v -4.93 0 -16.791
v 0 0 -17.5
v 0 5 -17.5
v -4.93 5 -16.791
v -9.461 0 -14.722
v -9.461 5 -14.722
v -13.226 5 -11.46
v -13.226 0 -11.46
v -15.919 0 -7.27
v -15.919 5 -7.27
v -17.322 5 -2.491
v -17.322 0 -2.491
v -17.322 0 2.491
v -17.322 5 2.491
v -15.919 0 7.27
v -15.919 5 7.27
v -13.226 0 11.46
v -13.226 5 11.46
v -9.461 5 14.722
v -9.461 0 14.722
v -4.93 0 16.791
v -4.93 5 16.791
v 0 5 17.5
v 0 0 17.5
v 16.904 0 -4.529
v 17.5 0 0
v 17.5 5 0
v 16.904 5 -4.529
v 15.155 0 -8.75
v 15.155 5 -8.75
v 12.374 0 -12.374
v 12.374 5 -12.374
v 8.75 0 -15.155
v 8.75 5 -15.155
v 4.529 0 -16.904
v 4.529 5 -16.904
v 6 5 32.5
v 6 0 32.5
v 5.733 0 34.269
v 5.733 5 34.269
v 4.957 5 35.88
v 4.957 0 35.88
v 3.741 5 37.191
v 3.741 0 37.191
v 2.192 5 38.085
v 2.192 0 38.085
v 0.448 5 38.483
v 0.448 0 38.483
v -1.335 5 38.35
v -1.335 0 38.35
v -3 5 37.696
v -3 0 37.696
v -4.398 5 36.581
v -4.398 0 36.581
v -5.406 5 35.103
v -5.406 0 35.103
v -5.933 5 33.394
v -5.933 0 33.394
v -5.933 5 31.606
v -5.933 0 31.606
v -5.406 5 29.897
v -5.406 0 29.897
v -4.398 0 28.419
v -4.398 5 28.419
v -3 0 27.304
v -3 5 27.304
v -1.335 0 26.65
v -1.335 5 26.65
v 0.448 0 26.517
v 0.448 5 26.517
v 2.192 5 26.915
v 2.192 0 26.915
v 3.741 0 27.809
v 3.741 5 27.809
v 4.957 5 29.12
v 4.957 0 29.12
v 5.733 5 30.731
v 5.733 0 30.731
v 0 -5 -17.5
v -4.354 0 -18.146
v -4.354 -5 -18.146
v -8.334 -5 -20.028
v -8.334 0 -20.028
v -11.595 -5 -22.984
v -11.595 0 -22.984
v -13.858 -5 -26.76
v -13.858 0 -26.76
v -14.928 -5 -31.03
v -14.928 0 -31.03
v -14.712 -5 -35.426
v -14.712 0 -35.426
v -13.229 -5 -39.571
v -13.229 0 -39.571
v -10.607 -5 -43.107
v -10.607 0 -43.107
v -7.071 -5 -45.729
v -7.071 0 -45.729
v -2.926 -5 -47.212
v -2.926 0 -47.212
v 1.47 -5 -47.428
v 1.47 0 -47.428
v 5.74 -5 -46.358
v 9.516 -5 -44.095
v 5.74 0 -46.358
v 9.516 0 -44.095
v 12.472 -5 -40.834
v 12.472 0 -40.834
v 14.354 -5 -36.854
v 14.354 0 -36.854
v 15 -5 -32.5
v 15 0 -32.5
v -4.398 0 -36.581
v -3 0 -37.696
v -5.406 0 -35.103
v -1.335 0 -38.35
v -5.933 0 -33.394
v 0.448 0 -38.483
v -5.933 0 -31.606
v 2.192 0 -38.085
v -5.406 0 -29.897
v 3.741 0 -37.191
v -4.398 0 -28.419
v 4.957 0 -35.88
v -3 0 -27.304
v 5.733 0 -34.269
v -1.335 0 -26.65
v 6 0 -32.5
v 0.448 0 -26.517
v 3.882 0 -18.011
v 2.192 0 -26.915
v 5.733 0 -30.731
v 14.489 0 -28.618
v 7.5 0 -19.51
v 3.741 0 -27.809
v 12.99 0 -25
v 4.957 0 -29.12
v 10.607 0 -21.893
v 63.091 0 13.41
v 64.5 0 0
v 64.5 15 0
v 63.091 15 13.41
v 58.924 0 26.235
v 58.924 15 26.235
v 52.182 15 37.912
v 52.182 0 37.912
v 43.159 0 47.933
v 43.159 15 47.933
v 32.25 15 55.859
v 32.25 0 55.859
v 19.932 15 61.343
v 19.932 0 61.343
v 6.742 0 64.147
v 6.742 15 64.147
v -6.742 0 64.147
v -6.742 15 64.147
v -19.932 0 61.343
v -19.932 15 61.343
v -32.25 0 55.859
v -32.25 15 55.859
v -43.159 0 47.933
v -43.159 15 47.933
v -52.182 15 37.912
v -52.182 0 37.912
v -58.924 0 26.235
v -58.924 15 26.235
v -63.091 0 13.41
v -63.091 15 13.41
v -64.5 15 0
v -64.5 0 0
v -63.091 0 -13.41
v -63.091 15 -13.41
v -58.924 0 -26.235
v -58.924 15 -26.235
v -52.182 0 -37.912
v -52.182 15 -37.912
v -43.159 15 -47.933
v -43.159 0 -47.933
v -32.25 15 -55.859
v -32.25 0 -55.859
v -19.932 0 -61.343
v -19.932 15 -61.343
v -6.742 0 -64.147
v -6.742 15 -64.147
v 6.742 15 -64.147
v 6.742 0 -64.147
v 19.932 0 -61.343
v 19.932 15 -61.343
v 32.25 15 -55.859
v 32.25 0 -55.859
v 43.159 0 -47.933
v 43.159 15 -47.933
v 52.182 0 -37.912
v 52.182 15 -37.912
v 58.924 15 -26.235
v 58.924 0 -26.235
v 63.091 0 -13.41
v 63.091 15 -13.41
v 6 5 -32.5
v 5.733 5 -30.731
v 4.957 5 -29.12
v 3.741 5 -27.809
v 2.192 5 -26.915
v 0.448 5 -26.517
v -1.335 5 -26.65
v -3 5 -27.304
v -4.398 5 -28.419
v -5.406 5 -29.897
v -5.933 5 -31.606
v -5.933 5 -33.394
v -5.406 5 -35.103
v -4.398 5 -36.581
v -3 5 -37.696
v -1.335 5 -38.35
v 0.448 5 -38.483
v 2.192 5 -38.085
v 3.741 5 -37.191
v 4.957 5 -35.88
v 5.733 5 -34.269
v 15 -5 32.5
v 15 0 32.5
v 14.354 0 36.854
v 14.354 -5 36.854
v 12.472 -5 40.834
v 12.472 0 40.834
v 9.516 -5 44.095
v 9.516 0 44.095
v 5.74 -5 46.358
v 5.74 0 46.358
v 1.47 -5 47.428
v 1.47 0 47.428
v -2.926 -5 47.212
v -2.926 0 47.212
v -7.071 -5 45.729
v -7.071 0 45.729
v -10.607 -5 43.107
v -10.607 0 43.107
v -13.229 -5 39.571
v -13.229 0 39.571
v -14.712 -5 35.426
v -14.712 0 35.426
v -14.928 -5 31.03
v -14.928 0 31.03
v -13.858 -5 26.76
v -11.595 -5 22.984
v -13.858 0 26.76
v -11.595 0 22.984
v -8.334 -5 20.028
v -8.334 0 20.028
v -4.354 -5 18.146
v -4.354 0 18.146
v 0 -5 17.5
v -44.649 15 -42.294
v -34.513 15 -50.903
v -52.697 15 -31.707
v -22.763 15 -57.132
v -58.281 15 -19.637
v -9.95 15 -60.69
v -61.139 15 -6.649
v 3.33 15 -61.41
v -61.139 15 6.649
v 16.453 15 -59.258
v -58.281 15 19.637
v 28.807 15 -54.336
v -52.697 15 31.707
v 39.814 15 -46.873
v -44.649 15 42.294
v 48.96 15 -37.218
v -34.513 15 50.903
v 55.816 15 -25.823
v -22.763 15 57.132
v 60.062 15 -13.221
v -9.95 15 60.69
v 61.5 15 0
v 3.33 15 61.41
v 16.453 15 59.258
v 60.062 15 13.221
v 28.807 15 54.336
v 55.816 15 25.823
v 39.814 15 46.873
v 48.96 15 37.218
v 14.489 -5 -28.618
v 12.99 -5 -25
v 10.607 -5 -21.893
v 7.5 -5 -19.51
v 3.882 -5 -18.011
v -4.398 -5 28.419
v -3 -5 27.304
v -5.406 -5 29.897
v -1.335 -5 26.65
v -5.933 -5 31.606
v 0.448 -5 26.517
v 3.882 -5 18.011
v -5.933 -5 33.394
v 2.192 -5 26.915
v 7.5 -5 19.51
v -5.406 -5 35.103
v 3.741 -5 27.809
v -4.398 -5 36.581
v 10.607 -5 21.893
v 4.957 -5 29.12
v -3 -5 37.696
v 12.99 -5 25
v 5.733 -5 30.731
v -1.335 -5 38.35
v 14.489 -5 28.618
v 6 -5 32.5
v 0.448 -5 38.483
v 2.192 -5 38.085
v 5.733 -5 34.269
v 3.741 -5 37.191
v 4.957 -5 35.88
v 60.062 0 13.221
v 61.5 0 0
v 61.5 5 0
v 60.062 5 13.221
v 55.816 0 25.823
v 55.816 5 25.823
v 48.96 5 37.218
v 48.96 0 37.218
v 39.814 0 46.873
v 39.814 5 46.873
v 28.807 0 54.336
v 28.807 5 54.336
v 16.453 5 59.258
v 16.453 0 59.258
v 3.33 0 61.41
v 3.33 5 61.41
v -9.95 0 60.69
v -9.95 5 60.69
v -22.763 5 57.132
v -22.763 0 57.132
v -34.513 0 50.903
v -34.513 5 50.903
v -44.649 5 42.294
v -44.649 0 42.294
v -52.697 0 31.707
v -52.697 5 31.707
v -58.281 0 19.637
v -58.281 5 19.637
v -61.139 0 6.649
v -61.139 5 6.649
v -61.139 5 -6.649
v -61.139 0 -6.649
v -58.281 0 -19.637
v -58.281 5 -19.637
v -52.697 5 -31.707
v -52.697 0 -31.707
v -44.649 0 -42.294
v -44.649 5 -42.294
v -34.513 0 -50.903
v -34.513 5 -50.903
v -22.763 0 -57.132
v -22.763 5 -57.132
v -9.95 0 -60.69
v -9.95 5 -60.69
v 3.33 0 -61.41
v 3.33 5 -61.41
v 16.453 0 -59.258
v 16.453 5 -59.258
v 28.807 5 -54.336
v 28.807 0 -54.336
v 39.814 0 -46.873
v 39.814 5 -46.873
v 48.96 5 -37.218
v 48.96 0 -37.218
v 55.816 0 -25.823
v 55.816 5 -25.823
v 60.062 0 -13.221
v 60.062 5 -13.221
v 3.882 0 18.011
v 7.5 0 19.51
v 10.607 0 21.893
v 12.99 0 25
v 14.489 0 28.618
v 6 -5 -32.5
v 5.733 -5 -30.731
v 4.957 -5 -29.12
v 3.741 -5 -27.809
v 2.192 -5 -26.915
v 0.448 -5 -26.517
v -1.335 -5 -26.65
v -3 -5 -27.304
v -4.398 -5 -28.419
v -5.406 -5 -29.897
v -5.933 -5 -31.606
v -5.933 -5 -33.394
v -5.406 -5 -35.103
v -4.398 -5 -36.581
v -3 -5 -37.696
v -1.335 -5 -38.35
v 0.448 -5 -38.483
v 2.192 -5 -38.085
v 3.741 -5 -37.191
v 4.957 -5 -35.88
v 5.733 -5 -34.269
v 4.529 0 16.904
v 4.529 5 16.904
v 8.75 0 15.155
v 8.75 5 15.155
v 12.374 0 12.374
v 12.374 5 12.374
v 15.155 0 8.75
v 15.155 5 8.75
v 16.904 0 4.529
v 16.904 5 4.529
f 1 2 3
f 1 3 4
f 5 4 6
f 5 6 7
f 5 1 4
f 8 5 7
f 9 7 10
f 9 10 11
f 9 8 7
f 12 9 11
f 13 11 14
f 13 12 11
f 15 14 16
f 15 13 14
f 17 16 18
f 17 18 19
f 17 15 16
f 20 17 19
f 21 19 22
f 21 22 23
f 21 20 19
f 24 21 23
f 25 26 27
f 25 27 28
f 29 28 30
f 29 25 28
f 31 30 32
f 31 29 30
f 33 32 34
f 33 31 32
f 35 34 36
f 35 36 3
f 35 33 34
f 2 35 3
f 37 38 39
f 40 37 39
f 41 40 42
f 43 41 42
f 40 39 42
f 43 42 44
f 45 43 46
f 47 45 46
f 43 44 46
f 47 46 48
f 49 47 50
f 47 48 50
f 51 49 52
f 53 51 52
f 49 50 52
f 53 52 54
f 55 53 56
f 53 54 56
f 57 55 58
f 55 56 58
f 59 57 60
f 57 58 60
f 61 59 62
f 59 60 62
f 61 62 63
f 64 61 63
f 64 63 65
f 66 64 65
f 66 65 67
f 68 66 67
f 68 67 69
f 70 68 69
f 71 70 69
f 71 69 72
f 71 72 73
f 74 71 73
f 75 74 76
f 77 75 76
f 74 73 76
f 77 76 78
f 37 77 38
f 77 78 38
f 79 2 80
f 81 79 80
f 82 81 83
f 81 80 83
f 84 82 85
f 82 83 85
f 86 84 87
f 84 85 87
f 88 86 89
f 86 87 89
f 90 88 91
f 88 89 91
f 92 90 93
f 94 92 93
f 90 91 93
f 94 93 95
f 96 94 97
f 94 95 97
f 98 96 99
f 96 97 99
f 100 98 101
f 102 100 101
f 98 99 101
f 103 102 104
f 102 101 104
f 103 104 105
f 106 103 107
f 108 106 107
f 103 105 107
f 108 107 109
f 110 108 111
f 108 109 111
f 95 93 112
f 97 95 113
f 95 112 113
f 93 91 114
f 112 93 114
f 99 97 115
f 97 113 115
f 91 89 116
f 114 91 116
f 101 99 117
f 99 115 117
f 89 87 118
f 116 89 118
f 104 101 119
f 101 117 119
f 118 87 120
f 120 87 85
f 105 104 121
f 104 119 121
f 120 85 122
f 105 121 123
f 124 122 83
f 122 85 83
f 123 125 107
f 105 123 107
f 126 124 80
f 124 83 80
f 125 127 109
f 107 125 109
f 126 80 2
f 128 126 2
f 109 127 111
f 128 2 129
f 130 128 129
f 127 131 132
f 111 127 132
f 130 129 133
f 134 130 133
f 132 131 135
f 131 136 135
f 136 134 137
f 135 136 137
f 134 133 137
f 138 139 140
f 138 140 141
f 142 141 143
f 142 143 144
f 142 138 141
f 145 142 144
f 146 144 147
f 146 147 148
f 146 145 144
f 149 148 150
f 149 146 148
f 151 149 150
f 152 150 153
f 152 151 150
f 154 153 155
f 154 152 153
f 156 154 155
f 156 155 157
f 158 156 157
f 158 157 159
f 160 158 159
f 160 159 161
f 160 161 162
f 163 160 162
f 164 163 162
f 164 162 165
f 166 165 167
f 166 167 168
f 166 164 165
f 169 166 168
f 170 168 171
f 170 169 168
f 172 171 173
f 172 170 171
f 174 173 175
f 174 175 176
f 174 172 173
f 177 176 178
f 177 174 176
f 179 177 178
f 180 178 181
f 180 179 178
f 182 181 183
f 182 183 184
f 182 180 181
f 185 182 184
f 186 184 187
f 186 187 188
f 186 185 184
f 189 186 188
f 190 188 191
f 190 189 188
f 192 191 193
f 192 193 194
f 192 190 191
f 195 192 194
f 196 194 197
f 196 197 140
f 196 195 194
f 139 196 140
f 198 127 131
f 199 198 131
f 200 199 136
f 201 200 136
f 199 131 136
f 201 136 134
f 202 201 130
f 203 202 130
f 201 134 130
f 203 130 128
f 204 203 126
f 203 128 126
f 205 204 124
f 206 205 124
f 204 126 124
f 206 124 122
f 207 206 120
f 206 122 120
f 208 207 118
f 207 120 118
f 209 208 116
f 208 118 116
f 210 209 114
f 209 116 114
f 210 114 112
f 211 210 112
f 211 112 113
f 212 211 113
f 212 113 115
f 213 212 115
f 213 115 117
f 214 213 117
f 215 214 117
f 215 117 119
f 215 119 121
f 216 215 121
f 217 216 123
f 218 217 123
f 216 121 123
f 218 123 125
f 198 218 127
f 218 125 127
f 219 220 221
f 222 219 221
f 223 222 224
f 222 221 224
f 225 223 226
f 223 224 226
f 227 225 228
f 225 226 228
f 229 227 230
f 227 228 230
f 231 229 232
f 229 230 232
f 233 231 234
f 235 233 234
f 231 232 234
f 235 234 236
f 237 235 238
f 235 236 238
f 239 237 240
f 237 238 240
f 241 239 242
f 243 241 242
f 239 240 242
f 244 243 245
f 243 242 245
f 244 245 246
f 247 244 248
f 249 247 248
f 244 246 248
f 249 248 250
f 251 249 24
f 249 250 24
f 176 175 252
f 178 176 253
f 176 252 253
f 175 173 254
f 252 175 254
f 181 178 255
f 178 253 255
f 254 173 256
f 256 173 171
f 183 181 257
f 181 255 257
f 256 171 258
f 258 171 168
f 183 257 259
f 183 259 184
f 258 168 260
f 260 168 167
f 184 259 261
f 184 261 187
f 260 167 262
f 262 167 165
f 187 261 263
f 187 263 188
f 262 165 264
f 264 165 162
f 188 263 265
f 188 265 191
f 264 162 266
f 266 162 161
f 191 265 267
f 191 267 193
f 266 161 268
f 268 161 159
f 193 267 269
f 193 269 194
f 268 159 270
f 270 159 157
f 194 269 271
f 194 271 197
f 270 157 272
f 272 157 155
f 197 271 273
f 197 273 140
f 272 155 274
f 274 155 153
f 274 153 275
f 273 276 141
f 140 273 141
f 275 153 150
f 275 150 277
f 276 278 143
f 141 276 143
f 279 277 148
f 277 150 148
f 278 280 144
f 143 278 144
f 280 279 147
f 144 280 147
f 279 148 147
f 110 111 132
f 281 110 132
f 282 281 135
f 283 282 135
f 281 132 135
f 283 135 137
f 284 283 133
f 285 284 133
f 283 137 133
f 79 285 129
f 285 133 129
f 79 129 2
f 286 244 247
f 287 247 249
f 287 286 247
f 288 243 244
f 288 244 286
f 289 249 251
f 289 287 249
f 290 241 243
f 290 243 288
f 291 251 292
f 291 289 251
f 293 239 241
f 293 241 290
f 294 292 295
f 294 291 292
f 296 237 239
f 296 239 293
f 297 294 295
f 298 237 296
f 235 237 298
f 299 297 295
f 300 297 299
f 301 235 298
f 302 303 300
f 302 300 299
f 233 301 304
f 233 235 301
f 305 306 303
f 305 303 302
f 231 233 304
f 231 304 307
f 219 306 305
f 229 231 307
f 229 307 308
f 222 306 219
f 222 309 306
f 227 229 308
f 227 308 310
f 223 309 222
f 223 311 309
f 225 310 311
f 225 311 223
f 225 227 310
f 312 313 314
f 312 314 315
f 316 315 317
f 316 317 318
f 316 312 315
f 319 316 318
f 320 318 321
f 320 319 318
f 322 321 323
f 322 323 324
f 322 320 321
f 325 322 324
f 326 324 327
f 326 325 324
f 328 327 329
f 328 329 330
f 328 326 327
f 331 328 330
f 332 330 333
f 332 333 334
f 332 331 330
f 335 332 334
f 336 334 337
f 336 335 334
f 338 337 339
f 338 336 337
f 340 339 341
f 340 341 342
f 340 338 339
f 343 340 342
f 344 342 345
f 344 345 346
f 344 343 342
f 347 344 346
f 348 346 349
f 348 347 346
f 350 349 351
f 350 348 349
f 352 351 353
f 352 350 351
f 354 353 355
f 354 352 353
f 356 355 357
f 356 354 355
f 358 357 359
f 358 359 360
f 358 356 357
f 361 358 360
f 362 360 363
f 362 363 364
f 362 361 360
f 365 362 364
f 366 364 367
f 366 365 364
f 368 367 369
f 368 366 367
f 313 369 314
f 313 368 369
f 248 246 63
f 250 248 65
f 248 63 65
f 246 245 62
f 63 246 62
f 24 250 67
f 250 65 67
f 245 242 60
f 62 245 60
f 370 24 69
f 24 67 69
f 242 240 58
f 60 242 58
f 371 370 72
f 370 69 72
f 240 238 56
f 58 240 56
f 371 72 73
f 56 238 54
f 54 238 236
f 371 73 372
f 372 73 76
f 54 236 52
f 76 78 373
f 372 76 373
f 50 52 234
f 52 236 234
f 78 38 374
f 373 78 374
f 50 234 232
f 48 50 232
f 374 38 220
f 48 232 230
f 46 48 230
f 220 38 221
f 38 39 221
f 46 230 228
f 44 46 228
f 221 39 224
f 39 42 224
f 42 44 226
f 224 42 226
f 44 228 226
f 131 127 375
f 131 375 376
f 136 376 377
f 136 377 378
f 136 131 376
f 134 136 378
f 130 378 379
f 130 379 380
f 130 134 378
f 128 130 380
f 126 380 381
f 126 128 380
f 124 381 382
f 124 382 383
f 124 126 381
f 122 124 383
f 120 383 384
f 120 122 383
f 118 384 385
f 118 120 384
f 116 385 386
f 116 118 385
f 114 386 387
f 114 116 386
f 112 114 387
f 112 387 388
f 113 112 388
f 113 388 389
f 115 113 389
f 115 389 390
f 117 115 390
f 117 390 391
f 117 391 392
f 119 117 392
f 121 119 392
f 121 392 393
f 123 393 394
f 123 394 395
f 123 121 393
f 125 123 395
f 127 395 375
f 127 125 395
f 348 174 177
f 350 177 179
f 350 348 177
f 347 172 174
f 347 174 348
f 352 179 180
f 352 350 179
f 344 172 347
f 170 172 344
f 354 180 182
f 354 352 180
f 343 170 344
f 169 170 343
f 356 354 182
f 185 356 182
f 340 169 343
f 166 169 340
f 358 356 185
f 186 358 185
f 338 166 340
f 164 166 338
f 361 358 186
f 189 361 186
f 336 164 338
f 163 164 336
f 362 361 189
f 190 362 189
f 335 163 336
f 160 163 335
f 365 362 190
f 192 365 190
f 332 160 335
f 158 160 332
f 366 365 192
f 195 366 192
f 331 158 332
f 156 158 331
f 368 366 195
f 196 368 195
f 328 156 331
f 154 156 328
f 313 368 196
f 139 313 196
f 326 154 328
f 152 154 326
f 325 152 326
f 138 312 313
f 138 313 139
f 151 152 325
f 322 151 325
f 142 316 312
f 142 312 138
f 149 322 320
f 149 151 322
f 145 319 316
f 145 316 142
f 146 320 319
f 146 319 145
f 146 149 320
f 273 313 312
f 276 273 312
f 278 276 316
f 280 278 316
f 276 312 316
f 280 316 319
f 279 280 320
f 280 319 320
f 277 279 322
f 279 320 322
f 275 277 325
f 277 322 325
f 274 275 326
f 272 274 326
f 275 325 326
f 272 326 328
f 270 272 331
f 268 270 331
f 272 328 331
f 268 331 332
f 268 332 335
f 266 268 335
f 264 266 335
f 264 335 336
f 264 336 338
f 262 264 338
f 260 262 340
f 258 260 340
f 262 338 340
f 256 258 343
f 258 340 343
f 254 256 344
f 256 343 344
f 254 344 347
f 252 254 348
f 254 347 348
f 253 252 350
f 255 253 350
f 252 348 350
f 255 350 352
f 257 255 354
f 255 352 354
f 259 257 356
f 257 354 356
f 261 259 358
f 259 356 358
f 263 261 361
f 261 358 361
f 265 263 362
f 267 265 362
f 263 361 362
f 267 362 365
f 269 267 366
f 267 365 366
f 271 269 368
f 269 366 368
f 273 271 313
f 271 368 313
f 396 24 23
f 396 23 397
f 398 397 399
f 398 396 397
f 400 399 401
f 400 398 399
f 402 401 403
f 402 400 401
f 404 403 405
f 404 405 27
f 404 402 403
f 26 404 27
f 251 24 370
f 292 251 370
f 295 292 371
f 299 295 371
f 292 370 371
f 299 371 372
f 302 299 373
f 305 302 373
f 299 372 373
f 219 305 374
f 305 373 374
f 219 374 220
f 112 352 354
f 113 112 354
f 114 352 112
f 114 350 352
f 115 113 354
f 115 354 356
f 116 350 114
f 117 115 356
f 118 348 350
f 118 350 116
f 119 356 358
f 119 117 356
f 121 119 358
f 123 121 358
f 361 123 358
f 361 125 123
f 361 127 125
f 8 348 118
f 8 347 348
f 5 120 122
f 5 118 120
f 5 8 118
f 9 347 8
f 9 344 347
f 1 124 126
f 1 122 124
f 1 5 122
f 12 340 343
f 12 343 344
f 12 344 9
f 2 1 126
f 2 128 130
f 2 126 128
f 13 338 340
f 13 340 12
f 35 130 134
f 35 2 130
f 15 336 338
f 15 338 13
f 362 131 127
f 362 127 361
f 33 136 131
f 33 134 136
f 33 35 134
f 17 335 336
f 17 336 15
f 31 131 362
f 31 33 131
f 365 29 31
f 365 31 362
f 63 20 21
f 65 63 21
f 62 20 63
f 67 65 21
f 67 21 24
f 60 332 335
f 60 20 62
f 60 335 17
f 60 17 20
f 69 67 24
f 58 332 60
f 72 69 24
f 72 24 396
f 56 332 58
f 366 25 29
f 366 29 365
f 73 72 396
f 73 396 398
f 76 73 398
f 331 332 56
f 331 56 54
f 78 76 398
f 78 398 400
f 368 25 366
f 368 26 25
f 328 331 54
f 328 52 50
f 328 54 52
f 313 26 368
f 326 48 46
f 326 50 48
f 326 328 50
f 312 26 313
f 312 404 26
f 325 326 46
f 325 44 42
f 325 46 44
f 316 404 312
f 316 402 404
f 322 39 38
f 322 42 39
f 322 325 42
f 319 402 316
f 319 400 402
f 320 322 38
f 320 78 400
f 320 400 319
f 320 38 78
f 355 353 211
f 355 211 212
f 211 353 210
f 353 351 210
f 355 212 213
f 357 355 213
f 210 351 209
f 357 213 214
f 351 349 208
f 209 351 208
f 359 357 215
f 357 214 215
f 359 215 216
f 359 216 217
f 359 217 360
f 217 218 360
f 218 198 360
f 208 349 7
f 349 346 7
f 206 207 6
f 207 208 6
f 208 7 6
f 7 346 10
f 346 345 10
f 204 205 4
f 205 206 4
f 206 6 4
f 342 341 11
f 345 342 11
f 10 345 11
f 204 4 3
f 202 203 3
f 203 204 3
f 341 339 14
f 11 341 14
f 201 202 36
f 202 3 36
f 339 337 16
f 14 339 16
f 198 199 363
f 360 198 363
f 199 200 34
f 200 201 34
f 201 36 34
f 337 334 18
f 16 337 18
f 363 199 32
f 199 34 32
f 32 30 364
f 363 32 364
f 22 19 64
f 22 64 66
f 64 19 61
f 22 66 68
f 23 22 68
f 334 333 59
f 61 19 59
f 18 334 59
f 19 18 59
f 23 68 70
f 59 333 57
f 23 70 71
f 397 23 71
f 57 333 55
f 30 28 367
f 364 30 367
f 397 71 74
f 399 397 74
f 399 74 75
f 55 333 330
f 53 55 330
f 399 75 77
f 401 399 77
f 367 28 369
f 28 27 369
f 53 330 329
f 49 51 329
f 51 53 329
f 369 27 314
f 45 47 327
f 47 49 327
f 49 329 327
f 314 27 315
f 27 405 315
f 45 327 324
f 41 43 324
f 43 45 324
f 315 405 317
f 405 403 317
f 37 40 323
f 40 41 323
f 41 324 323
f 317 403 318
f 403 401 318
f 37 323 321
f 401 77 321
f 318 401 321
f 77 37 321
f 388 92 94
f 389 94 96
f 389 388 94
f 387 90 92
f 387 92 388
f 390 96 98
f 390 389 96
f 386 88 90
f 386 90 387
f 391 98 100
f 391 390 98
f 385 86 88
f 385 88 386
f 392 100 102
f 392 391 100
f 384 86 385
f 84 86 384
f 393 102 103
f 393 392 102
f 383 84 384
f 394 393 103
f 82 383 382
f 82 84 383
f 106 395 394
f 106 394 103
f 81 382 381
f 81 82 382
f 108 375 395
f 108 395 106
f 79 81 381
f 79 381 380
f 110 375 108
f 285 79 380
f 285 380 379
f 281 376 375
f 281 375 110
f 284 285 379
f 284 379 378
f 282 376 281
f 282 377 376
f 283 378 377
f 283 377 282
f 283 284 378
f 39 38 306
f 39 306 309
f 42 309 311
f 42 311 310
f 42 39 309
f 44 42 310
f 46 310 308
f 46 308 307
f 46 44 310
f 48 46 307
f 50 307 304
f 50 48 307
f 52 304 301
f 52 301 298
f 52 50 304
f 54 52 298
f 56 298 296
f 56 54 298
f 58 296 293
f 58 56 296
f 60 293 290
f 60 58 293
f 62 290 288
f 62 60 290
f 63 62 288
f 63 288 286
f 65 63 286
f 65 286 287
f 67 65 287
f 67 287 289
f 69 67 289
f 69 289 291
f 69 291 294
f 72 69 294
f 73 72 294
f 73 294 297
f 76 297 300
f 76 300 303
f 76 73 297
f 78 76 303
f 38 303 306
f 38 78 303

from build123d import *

# Parameters (mm, degrees)
F0_R     = 61.5
F0_R_2   = 6
F1_DEPTH = 5
F0_R_3   = 64.5
F2_DEPTH = 15
F3_DEPTH = 5


with BuildPart() as f1:
    # F0 (on Front) → F1 (new body)
    with BuildSketch(Plane.XZ):
        Circle(F0_R)
        with BuildLine():
            ThreePointArc((15, -32.5), (-10.606602, -43.106602), (0, -17.5))
            ThreePointArc((0, -17.5), (10.606602, -21.893398), (15, -32.5))
        make_face(mode=Mode.SUBTRACT)
        with BuildLine():
            ThreePointArc((0, 17.5), (12.374369, 12.374369), (17.5, 0))
            ThreePointArc((17.5, 0), (12.374369, -12.374369), (0, -17.5))
            ThreePointArc((0, -17.5), (-17.5, 0), (0, 17.5))
        make_face(mode=Mode.SUBTRACT)
        with BuildLine():
            ThreePointArc((15, 32.5), (10.606602, 21.893398), (0, 17.5))
            ThreePointArc((0, 17.5), (-10.606602, 43.106602), (15, 32.5))
        make_face(mode=Mode.SUBTRACT)
        with BuildLine():
            ThreePointArc((15, 32.5), (-10.606602, 43.106602), (0, 17.5))
            ThreePointArc((0, 17.5), (10.606602, 21.893398), (15, 32.5))
        make_face()
        with Locations((0, 32.5)):
            Circle(F0_R_2, mode=Mode.SUBTRACT)
        with BuildLine():
            ThreePointArc((15, -32.5), (10.606602, -21.893398), (0, -17.5))
            ThreePointArc((0, -17.5), (-10.606602, -43.106602), (15, -32.5))
        make_face()
        with Locations((0, -32.5)):
            Circle(F0_R_2, mode=Mode.SUBTRACT)
    extrude(amount=-F1_DEPTH)


with BuildPart() as f2:
    # F0 (on Front) → F2 (new body)
    with BuildSketch(Plane.XZ):
        Circle(F0_R_3)
        Circle(F0_R, mode=Mode.SUBTRACT)
    extrude(amount=-F2_DEPTH)


with BuildPart() as f3:
    # F0 (on Front) → F3 (new body)
    with BuildSketch(Plane.XZ):
        with BuildLine():
            ThreePointArc((15, 32.5), (-10.606602, 43.106602), (0, 17.5))
            ThreePointArc((0, 17.5), (10.606602, 21.893398), (15, 32.5))
        make_face()
        with Locations((0, 32.5)):
            Circle(F0_R_2, mode=Mode.SUBTRACT)
        with BuildLine():
            ThreePointArc((15, -32.5), (10.606602, -21.893398), (0, -17.5))
            ThreePointArc((0, -17.5), (-10.606602, -43.106602), (15, -32.5))
        make_face()
        with Locations((0, -32.5)):
            Circle(F0_R_2, mode=Mode.SUBTRACT)
    extrude(amount=F3_DEPTH)


solid = Compound([f1.part, f2.part, f3.part])
